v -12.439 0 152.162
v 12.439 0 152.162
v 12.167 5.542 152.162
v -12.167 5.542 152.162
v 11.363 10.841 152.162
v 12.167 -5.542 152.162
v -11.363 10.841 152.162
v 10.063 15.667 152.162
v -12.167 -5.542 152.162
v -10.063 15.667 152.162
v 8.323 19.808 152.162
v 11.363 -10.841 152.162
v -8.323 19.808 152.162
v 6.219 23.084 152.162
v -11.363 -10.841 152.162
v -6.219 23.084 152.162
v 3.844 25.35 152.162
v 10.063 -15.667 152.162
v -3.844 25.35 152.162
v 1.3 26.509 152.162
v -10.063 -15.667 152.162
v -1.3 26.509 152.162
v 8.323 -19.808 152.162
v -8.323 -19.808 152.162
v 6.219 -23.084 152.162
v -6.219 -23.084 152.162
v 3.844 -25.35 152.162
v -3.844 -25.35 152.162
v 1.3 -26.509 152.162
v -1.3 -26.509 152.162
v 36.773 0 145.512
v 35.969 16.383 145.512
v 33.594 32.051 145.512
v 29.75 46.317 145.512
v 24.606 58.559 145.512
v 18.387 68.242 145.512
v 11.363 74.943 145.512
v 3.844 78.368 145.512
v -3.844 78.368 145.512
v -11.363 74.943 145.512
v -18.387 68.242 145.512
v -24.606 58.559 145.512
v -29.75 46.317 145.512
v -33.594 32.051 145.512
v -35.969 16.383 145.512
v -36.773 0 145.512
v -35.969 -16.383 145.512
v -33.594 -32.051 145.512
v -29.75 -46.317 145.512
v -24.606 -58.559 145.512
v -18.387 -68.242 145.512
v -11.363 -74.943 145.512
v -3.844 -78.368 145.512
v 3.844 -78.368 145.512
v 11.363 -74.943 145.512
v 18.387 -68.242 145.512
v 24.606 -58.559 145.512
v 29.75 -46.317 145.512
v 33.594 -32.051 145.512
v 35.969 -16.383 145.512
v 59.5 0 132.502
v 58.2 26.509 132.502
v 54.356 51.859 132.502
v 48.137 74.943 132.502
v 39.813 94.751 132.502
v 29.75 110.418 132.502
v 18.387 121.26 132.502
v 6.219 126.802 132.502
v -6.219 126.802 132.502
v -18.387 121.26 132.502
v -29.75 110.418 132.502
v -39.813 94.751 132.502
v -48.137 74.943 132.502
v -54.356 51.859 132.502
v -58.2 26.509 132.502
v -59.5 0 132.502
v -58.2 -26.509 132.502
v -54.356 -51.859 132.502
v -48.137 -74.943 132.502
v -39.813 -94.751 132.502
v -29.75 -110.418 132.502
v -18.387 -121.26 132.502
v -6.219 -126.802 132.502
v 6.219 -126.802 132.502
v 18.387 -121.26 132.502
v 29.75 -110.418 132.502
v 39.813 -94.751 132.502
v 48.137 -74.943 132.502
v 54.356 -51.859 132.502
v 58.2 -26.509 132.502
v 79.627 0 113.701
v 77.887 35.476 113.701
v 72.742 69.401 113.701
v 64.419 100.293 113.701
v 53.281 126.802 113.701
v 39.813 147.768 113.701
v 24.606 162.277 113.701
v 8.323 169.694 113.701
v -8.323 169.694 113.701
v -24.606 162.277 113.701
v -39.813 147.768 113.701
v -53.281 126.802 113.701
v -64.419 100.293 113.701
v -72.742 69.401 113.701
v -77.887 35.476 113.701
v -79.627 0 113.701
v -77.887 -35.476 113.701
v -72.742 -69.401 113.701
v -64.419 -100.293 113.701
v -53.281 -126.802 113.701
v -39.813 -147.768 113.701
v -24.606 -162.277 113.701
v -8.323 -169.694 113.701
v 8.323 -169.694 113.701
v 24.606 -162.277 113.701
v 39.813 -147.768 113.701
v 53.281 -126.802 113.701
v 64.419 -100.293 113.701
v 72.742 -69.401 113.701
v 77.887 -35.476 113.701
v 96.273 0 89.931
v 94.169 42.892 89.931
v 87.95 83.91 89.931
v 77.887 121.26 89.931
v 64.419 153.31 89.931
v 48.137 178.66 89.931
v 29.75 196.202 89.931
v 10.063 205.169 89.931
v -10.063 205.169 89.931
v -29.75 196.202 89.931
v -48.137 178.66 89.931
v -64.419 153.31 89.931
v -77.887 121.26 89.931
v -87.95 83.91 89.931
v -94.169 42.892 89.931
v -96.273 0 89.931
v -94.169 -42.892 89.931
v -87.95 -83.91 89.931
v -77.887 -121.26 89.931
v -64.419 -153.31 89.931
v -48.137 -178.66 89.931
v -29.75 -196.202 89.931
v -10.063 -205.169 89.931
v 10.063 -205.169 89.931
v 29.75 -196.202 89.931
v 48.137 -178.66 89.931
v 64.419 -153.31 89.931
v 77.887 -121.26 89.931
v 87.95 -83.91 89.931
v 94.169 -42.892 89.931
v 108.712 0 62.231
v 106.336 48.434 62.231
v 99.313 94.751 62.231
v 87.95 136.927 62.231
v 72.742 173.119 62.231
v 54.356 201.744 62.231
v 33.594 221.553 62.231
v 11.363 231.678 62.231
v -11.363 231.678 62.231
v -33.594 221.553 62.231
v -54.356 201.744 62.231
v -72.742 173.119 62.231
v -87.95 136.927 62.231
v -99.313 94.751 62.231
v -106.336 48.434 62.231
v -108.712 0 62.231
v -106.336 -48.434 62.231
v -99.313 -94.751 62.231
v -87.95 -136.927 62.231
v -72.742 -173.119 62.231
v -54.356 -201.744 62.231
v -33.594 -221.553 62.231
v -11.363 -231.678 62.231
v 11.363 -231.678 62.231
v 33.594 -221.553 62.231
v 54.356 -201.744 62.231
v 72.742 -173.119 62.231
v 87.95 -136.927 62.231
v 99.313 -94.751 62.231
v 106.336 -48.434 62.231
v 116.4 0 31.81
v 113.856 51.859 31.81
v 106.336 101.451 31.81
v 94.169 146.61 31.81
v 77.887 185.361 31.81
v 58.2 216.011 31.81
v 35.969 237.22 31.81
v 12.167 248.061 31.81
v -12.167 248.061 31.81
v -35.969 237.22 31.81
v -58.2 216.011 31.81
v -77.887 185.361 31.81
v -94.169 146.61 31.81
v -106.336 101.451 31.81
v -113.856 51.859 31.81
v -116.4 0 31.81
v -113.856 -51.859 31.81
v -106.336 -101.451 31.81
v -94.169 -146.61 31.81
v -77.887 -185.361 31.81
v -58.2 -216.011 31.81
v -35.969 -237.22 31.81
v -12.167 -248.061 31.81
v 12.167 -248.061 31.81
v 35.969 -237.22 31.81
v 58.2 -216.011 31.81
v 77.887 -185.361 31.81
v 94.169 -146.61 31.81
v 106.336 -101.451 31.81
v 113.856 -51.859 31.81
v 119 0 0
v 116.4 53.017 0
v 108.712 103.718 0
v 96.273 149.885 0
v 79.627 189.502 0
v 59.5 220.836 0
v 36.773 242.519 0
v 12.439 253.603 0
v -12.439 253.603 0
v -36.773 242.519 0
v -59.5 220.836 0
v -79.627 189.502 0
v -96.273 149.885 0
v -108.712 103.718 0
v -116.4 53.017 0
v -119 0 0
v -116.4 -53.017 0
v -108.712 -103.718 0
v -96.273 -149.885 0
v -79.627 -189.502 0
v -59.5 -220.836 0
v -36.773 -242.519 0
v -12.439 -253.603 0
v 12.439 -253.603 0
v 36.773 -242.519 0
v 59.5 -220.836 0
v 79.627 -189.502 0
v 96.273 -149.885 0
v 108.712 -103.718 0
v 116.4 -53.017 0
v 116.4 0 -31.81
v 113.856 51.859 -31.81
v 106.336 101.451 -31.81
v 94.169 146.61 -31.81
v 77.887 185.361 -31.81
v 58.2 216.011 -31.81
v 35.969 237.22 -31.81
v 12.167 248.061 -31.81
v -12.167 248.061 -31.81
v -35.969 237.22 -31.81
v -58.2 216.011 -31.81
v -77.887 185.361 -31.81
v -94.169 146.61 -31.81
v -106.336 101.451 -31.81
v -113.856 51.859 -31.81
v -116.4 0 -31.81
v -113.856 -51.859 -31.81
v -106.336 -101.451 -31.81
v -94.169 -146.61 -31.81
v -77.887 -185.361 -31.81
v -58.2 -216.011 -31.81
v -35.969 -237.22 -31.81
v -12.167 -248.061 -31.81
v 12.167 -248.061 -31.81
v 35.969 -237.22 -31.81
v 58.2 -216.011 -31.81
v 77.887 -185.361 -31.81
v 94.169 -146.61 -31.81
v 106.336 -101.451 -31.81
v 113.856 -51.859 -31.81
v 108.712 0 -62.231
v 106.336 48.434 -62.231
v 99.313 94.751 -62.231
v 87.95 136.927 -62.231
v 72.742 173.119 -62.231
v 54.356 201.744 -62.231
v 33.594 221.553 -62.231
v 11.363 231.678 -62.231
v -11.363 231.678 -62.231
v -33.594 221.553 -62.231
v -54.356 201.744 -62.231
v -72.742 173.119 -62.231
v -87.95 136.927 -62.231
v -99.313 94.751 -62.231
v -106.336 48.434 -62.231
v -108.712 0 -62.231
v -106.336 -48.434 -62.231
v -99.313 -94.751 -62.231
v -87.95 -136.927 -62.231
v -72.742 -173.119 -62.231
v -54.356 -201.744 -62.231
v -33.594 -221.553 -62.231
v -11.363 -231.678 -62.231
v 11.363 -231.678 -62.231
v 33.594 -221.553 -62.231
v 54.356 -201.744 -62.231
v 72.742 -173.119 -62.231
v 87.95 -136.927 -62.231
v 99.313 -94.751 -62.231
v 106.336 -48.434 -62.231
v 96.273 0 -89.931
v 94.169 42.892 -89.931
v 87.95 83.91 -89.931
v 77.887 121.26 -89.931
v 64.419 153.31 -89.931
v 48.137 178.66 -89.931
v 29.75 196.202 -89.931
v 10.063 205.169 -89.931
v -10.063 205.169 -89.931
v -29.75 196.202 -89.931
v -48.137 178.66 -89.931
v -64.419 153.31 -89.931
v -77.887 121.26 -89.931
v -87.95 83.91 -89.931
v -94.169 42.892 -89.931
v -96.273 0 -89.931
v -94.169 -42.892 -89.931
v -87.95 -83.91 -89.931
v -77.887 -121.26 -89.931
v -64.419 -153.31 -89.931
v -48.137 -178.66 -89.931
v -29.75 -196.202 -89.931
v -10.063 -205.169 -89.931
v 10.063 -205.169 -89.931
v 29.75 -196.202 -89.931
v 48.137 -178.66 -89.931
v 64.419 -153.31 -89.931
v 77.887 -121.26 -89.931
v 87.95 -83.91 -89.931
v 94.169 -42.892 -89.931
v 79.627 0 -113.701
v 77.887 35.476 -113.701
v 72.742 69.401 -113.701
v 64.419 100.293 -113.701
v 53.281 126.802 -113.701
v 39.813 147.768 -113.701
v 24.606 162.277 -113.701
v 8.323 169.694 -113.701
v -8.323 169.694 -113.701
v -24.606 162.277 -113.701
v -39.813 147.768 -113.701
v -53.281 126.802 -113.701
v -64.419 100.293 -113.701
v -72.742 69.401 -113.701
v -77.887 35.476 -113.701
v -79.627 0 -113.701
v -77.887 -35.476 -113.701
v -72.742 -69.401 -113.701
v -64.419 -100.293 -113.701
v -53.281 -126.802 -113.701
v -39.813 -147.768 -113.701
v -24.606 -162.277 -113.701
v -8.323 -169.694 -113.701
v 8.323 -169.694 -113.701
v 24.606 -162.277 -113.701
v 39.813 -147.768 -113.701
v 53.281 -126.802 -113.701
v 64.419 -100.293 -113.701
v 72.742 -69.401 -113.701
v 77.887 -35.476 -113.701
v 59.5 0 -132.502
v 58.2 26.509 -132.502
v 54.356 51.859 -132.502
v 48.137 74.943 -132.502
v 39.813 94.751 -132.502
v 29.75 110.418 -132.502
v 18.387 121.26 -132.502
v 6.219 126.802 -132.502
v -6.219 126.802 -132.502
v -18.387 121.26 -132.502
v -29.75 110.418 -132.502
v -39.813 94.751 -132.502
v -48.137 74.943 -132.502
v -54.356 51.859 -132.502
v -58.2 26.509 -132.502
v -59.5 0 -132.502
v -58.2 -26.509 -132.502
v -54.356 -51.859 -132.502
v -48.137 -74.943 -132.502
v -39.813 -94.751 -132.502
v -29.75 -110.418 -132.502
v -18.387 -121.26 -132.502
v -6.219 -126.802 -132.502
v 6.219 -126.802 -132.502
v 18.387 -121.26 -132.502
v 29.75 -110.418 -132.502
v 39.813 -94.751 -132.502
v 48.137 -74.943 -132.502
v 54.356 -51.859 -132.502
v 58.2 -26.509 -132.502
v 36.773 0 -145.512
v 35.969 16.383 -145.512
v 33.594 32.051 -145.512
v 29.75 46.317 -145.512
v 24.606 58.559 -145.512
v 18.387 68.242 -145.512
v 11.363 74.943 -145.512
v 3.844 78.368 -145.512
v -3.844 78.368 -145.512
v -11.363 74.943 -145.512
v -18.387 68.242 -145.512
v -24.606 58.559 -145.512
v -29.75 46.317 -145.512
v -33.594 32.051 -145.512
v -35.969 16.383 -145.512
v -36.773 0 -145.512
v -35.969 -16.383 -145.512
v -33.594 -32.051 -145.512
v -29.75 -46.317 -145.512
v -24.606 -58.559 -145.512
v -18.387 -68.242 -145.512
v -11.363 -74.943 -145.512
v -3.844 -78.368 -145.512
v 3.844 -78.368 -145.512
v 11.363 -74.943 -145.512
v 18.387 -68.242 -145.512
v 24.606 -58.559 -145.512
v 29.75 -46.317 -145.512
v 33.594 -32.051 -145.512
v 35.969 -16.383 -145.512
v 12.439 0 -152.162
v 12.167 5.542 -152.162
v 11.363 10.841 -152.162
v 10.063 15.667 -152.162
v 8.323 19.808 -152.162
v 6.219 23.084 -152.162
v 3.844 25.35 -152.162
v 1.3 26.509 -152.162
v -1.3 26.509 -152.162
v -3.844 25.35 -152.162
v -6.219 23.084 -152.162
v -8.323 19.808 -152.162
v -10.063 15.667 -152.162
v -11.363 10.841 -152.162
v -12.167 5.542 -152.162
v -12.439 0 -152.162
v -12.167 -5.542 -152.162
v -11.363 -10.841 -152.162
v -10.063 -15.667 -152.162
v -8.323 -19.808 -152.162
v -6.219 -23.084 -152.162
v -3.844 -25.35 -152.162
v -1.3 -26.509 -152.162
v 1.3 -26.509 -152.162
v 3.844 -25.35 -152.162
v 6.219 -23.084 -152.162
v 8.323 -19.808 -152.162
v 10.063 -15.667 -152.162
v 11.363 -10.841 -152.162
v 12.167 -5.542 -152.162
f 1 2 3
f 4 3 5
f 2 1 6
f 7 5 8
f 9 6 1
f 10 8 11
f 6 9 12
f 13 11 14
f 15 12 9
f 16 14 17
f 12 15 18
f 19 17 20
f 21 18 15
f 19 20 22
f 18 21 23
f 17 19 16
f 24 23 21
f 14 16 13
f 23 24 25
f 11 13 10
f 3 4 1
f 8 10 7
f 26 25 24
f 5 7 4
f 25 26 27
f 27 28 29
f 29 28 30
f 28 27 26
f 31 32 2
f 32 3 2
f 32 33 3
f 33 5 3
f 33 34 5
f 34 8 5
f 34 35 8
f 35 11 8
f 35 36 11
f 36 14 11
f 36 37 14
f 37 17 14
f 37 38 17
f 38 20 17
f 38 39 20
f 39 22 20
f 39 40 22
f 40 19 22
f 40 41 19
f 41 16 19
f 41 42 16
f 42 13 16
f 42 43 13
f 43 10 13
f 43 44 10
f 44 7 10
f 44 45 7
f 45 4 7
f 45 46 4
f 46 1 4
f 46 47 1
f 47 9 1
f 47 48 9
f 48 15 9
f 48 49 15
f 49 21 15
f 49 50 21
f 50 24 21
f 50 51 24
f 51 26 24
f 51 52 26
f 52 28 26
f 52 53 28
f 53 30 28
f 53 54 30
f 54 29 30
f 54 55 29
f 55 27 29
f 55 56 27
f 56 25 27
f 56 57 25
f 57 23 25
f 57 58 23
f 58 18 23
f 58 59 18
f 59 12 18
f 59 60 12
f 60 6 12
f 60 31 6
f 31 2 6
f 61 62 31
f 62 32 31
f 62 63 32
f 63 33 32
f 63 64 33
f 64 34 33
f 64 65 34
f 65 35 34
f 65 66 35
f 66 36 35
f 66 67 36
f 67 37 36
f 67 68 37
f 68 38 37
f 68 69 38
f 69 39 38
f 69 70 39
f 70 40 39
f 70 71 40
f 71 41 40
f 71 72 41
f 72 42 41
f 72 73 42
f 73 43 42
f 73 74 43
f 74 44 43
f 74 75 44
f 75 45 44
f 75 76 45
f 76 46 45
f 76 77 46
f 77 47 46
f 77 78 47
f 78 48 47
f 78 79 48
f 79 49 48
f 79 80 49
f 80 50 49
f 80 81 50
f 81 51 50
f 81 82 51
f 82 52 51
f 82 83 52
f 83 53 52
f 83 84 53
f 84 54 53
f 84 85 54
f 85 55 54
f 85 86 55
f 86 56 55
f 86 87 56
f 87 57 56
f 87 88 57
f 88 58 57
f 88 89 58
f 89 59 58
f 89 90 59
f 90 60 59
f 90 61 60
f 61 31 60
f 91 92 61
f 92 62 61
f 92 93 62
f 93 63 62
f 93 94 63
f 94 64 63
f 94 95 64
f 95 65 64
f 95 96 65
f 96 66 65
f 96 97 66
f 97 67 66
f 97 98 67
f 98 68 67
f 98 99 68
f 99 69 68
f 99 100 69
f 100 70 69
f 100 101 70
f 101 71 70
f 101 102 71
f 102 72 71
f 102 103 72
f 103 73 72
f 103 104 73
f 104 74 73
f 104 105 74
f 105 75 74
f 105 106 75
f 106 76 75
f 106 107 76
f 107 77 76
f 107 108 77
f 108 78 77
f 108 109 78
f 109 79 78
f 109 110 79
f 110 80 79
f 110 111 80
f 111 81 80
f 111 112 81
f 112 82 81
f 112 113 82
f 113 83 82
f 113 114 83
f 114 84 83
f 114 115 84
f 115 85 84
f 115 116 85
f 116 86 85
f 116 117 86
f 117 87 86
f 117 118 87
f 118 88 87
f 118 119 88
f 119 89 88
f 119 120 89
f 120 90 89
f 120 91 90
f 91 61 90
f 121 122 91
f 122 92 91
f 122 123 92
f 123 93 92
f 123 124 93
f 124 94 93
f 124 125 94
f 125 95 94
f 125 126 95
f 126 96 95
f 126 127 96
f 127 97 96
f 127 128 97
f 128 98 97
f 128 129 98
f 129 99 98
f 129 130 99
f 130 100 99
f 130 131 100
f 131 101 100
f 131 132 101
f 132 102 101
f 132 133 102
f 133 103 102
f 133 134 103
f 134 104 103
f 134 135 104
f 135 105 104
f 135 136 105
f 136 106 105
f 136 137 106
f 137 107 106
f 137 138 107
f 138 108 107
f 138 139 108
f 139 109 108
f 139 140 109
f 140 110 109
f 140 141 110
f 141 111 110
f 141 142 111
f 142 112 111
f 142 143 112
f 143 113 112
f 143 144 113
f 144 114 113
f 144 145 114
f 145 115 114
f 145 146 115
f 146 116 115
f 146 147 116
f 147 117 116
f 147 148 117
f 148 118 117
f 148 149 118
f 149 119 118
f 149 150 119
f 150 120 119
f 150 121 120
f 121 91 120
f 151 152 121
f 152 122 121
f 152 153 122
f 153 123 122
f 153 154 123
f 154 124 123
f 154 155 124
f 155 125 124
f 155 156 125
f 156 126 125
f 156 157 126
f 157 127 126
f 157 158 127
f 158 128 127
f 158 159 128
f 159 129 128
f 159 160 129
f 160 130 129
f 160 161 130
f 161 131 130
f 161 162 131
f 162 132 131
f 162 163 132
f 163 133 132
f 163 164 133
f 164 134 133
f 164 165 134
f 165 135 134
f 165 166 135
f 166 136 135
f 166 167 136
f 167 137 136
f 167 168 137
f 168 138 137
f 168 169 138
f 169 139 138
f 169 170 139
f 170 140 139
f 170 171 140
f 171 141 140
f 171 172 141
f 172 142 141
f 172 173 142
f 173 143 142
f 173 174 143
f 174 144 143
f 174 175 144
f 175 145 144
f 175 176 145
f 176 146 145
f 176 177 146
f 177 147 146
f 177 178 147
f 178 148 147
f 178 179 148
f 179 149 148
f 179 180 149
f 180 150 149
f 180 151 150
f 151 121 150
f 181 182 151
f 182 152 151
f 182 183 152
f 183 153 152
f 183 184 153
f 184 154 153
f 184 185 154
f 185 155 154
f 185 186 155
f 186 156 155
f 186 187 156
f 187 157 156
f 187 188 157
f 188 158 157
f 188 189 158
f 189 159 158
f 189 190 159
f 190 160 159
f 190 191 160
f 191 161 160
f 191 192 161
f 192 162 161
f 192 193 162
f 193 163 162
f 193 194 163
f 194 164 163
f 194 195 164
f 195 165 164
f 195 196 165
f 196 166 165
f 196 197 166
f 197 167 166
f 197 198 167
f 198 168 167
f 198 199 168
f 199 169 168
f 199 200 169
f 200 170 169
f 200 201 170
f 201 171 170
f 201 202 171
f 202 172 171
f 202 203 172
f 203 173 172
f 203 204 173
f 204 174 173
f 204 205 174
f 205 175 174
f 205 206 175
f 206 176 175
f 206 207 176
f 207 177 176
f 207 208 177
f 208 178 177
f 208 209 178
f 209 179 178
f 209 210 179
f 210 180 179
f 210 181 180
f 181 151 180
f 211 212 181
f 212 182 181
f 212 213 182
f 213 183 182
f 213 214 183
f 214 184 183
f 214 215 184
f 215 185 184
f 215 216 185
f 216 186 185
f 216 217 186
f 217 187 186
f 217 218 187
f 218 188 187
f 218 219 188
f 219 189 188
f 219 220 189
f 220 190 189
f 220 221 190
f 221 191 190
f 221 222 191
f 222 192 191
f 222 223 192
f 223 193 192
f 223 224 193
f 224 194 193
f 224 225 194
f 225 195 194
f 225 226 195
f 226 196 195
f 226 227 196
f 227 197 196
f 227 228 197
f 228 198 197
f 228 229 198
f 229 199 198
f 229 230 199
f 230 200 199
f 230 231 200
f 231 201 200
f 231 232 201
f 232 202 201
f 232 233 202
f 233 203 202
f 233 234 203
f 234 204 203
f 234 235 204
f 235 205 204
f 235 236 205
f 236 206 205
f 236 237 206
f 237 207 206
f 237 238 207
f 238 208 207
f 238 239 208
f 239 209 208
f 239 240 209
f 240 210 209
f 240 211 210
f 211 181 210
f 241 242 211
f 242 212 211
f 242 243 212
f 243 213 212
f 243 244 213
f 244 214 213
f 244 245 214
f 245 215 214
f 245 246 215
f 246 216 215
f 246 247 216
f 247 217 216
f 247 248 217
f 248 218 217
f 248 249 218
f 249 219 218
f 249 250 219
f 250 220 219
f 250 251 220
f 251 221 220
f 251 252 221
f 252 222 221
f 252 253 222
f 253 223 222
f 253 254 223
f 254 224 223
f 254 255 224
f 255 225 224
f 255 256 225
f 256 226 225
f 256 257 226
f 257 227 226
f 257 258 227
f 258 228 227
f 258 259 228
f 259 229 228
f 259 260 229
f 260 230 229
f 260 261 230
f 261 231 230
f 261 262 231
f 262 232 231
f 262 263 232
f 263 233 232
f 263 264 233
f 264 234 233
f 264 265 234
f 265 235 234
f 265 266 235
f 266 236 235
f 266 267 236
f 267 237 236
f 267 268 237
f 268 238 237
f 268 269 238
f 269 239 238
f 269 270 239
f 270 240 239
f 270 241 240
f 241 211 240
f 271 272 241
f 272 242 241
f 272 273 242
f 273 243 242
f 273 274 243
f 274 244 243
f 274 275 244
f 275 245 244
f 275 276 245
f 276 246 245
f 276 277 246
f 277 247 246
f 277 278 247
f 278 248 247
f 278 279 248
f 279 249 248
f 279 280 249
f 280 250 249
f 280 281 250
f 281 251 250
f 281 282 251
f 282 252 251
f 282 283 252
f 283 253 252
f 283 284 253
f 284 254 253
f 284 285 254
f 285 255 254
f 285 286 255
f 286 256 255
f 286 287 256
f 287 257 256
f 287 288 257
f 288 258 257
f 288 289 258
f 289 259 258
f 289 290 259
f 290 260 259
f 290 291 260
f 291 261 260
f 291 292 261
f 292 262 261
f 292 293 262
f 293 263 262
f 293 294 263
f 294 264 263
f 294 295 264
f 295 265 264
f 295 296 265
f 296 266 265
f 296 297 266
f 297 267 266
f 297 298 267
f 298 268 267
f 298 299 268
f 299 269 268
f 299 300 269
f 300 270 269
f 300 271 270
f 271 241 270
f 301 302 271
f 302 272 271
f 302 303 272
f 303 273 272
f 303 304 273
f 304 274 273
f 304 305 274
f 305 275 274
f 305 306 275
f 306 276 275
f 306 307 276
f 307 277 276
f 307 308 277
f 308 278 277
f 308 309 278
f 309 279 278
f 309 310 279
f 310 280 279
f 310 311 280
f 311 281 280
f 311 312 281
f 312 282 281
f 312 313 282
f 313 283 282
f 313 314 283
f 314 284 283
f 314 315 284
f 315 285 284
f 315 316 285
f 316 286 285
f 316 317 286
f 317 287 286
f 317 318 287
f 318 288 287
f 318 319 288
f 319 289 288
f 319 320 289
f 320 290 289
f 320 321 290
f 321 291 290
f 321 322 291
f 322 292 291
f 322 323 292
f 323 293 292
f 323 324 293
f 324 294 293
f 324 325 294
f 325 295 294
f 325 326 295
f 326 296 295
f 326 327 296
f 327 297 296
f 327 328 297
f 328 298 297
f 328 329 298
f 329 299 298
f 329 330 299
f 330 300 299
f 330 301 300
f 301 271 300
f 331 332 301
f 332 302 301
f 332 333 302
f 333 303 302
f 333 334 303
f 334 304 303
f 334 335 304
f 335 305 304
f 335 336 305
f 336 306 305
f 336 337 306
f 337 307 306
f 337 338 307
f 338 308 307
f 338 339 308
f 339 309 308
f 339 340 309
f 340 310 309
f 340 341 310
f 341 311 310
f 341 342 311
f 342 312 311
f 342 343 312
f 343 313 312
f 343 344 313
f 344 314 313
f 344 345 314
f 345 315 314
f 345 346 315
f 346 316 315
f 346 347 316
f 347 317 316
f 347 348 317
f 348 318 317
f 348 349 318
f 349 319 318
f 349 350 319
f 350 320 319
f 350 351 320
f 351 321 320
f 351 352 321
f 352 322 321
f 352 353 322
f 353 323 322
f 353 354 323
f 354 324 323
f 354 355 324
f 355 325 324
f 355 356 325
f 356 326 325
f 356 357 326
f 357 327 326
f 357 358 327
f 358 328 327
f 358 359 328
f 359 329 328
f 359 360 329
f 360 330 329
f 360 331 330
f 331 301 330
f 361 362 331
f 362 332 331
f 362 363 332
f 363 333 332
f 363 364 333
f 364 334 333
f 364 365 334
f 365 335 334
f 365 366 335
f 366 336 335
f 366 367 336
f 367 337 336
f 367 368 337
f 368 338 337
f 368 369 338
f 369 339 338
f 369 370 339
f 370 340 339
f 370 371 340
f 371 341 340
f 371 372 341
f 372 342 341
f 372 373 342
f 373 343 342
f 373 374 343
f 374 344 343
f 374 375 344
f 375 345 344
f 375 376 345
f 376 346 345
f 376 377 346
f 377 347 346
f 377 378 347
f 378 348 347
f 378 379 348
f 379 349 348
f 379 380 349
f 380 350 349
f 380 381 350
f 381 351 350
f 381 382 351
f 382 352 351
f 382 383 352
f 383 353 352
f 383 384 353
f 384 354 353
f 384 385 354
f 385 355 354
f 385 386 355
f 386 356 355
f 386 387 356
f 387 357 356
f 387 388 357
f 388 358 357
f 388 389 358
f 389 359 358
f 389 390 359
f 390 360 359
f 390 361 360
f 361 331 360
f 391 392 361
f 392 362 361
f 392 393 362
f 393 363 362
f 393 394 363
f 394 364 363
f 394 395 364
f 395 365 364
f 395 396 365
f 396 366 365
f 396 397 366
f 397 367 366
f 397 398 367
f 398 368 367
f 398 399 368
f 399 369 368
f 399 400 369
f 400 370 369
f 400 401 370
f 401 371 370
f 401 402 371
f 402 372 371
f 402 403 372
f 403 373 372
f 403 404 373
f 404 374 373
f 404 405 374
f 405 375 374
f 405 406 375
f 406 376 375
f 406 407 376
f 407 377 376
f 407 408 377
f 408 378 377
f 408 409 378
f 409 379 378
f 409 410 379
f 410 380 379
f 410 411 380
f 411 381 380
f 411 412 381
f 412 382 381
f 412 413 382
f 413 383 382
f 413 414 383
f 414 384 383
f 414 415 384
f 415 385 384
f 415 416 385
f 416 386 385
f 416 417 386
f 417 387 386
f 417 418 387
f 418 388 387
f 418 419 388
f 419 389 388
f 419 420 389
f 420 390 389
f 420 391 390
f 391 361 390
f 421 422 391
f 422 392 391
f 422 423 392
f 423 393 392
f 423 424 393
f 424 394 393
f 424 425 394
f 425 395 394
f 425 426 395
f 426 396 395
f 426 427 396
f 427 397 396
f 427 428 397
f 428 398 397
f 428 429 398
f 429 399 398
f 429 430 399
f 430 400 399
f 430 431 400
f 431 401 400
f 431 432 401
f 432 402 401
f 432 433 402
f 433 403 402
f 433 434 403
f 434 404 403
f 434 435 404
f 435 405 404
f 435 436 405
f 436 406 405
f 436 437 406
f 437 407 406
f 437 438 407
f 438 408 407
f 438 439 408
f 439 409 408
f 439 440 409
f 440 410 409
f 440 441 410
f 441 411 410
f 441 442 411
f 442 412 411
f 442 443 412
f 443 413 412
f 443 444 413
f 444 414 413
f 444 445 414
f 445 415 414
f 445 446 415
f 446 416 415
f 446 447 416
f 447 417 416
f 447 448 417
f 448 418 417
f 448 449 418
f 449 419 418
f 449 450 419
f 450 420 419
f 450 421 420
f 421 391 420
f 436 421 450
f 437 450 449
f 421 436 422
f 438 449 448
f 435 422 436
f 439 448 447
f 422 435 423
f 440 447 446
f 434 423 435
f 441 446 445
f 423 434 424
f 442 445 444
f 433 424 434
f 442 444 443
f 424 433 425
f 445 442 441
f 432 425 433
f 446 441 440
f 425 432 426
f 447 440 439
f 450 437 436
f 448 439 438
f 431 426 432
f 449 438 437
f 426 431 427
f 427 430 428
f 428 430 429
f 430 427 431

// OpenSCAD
// Generated by SolidPython 1.0.1 on 2020-07-29 00:46:48


scale(v = [7, 15, 9]) {
	sphere(r = 17);
}
/***********************************************
*********      SolidPython code:      **********
************************************************
 
# import packages: SolidPython
from solid import *
from solid.utils import *
from itertools import chain, combinations, permutations


class Resize:

    def __init__(self, scad_file):
        self.scad_file = scad_file
        #self.scad_file = import_scad(scad_file)
        # cone/cylinder param:
        self.r1 = 0
        self.r2 = 0
        self.h = 0
        # rectangular prism param:
        self.w = 0
        self.l = 0
        # ellipse param:
        self.r = 0

    # import OpenScad code (file name corresponds to shape)


    # classify shape + parameters
    def assign(self, param1, param2, param3):
        if self.scad_file == 'cone.scad':
            self.r1 = param1
            self.r2 = param2
            self.h = param3
        elif self.scad_file == 'cylinder.scad':
            self.r1 = param1
            self.r2 = param2
            self.h = param3
        elif self.scad_file == 'rectangularPrism.scad':
            self.h = param1
            self.l = param2
            self.w = param3
        else:
            self.r = param1
            self.h = param2

    # resize parameters
    def iterate(self):
        x = range(3, 20, 2)
        i = 1
        if self.scad_file == 'cone.scad':
            tempList = list(permutations(x, 2))
            for temp in tempList:
                param1 = temp[0]
                param2 = temp[1]
                filepath = 'produced_scad_files/' + 'cone' + str(param1) + '_' + str(param2) + '_' + '.scad'
                scad_render_to_file(cylinder(h=param1, r1=param2, r2=0), filepath)

        elif self.scad_file == 'cylinder.scad':
            tempList = list(permutations(x, 3))
            for temp in tempList:
                param1 = temp[0]
                param2 = temp[1]
                filepath = 'produced_scad_files/' + 'cylinder' + str(param1) + '_' + str(param2) + '_' + '.scad'
                scad_render_to_file(cylinder(h=param1, r1=param2, r2=param2), filepath)

        elif self.scad_file == 'rectangularPrism.scad':
            tempList = list(permutations(x, 3))
            for temp in tempList:
                param1 = temp[0]
                param2 = temp[1]
                param3 = temp[2]
                filepath = 'produced_scad_files/' + 'rectangularPrism' + str(param1) + '_' + str(param2) + '_' + str(
                    param3) + '.scad'
                scad_render_to_file(cube(size=(param1, param2, param3)), filepath)

        elif self.scad_file == 'ellipse.scad':
            tempList = list(permutations(x, 4))
            for temp in tempList:
                param1 = temp[0]
                param2 = temp[1]
                param3 = temp[2]
                param4 = temp[3]
                filepath = 'produced_scad_files/' + 'ellipse' + str(param1) + '_' + str(param2) + '_' + str(param3) + '_' + str(param4) + '.scad'
                scad_render_to_file(scale([param1, param2, param3])(sphere(r=param4)), filepath)

    def render_to_scadfile(self):
        scad_render_to_file(scad, 'example.scad') 
 
************************************************/
